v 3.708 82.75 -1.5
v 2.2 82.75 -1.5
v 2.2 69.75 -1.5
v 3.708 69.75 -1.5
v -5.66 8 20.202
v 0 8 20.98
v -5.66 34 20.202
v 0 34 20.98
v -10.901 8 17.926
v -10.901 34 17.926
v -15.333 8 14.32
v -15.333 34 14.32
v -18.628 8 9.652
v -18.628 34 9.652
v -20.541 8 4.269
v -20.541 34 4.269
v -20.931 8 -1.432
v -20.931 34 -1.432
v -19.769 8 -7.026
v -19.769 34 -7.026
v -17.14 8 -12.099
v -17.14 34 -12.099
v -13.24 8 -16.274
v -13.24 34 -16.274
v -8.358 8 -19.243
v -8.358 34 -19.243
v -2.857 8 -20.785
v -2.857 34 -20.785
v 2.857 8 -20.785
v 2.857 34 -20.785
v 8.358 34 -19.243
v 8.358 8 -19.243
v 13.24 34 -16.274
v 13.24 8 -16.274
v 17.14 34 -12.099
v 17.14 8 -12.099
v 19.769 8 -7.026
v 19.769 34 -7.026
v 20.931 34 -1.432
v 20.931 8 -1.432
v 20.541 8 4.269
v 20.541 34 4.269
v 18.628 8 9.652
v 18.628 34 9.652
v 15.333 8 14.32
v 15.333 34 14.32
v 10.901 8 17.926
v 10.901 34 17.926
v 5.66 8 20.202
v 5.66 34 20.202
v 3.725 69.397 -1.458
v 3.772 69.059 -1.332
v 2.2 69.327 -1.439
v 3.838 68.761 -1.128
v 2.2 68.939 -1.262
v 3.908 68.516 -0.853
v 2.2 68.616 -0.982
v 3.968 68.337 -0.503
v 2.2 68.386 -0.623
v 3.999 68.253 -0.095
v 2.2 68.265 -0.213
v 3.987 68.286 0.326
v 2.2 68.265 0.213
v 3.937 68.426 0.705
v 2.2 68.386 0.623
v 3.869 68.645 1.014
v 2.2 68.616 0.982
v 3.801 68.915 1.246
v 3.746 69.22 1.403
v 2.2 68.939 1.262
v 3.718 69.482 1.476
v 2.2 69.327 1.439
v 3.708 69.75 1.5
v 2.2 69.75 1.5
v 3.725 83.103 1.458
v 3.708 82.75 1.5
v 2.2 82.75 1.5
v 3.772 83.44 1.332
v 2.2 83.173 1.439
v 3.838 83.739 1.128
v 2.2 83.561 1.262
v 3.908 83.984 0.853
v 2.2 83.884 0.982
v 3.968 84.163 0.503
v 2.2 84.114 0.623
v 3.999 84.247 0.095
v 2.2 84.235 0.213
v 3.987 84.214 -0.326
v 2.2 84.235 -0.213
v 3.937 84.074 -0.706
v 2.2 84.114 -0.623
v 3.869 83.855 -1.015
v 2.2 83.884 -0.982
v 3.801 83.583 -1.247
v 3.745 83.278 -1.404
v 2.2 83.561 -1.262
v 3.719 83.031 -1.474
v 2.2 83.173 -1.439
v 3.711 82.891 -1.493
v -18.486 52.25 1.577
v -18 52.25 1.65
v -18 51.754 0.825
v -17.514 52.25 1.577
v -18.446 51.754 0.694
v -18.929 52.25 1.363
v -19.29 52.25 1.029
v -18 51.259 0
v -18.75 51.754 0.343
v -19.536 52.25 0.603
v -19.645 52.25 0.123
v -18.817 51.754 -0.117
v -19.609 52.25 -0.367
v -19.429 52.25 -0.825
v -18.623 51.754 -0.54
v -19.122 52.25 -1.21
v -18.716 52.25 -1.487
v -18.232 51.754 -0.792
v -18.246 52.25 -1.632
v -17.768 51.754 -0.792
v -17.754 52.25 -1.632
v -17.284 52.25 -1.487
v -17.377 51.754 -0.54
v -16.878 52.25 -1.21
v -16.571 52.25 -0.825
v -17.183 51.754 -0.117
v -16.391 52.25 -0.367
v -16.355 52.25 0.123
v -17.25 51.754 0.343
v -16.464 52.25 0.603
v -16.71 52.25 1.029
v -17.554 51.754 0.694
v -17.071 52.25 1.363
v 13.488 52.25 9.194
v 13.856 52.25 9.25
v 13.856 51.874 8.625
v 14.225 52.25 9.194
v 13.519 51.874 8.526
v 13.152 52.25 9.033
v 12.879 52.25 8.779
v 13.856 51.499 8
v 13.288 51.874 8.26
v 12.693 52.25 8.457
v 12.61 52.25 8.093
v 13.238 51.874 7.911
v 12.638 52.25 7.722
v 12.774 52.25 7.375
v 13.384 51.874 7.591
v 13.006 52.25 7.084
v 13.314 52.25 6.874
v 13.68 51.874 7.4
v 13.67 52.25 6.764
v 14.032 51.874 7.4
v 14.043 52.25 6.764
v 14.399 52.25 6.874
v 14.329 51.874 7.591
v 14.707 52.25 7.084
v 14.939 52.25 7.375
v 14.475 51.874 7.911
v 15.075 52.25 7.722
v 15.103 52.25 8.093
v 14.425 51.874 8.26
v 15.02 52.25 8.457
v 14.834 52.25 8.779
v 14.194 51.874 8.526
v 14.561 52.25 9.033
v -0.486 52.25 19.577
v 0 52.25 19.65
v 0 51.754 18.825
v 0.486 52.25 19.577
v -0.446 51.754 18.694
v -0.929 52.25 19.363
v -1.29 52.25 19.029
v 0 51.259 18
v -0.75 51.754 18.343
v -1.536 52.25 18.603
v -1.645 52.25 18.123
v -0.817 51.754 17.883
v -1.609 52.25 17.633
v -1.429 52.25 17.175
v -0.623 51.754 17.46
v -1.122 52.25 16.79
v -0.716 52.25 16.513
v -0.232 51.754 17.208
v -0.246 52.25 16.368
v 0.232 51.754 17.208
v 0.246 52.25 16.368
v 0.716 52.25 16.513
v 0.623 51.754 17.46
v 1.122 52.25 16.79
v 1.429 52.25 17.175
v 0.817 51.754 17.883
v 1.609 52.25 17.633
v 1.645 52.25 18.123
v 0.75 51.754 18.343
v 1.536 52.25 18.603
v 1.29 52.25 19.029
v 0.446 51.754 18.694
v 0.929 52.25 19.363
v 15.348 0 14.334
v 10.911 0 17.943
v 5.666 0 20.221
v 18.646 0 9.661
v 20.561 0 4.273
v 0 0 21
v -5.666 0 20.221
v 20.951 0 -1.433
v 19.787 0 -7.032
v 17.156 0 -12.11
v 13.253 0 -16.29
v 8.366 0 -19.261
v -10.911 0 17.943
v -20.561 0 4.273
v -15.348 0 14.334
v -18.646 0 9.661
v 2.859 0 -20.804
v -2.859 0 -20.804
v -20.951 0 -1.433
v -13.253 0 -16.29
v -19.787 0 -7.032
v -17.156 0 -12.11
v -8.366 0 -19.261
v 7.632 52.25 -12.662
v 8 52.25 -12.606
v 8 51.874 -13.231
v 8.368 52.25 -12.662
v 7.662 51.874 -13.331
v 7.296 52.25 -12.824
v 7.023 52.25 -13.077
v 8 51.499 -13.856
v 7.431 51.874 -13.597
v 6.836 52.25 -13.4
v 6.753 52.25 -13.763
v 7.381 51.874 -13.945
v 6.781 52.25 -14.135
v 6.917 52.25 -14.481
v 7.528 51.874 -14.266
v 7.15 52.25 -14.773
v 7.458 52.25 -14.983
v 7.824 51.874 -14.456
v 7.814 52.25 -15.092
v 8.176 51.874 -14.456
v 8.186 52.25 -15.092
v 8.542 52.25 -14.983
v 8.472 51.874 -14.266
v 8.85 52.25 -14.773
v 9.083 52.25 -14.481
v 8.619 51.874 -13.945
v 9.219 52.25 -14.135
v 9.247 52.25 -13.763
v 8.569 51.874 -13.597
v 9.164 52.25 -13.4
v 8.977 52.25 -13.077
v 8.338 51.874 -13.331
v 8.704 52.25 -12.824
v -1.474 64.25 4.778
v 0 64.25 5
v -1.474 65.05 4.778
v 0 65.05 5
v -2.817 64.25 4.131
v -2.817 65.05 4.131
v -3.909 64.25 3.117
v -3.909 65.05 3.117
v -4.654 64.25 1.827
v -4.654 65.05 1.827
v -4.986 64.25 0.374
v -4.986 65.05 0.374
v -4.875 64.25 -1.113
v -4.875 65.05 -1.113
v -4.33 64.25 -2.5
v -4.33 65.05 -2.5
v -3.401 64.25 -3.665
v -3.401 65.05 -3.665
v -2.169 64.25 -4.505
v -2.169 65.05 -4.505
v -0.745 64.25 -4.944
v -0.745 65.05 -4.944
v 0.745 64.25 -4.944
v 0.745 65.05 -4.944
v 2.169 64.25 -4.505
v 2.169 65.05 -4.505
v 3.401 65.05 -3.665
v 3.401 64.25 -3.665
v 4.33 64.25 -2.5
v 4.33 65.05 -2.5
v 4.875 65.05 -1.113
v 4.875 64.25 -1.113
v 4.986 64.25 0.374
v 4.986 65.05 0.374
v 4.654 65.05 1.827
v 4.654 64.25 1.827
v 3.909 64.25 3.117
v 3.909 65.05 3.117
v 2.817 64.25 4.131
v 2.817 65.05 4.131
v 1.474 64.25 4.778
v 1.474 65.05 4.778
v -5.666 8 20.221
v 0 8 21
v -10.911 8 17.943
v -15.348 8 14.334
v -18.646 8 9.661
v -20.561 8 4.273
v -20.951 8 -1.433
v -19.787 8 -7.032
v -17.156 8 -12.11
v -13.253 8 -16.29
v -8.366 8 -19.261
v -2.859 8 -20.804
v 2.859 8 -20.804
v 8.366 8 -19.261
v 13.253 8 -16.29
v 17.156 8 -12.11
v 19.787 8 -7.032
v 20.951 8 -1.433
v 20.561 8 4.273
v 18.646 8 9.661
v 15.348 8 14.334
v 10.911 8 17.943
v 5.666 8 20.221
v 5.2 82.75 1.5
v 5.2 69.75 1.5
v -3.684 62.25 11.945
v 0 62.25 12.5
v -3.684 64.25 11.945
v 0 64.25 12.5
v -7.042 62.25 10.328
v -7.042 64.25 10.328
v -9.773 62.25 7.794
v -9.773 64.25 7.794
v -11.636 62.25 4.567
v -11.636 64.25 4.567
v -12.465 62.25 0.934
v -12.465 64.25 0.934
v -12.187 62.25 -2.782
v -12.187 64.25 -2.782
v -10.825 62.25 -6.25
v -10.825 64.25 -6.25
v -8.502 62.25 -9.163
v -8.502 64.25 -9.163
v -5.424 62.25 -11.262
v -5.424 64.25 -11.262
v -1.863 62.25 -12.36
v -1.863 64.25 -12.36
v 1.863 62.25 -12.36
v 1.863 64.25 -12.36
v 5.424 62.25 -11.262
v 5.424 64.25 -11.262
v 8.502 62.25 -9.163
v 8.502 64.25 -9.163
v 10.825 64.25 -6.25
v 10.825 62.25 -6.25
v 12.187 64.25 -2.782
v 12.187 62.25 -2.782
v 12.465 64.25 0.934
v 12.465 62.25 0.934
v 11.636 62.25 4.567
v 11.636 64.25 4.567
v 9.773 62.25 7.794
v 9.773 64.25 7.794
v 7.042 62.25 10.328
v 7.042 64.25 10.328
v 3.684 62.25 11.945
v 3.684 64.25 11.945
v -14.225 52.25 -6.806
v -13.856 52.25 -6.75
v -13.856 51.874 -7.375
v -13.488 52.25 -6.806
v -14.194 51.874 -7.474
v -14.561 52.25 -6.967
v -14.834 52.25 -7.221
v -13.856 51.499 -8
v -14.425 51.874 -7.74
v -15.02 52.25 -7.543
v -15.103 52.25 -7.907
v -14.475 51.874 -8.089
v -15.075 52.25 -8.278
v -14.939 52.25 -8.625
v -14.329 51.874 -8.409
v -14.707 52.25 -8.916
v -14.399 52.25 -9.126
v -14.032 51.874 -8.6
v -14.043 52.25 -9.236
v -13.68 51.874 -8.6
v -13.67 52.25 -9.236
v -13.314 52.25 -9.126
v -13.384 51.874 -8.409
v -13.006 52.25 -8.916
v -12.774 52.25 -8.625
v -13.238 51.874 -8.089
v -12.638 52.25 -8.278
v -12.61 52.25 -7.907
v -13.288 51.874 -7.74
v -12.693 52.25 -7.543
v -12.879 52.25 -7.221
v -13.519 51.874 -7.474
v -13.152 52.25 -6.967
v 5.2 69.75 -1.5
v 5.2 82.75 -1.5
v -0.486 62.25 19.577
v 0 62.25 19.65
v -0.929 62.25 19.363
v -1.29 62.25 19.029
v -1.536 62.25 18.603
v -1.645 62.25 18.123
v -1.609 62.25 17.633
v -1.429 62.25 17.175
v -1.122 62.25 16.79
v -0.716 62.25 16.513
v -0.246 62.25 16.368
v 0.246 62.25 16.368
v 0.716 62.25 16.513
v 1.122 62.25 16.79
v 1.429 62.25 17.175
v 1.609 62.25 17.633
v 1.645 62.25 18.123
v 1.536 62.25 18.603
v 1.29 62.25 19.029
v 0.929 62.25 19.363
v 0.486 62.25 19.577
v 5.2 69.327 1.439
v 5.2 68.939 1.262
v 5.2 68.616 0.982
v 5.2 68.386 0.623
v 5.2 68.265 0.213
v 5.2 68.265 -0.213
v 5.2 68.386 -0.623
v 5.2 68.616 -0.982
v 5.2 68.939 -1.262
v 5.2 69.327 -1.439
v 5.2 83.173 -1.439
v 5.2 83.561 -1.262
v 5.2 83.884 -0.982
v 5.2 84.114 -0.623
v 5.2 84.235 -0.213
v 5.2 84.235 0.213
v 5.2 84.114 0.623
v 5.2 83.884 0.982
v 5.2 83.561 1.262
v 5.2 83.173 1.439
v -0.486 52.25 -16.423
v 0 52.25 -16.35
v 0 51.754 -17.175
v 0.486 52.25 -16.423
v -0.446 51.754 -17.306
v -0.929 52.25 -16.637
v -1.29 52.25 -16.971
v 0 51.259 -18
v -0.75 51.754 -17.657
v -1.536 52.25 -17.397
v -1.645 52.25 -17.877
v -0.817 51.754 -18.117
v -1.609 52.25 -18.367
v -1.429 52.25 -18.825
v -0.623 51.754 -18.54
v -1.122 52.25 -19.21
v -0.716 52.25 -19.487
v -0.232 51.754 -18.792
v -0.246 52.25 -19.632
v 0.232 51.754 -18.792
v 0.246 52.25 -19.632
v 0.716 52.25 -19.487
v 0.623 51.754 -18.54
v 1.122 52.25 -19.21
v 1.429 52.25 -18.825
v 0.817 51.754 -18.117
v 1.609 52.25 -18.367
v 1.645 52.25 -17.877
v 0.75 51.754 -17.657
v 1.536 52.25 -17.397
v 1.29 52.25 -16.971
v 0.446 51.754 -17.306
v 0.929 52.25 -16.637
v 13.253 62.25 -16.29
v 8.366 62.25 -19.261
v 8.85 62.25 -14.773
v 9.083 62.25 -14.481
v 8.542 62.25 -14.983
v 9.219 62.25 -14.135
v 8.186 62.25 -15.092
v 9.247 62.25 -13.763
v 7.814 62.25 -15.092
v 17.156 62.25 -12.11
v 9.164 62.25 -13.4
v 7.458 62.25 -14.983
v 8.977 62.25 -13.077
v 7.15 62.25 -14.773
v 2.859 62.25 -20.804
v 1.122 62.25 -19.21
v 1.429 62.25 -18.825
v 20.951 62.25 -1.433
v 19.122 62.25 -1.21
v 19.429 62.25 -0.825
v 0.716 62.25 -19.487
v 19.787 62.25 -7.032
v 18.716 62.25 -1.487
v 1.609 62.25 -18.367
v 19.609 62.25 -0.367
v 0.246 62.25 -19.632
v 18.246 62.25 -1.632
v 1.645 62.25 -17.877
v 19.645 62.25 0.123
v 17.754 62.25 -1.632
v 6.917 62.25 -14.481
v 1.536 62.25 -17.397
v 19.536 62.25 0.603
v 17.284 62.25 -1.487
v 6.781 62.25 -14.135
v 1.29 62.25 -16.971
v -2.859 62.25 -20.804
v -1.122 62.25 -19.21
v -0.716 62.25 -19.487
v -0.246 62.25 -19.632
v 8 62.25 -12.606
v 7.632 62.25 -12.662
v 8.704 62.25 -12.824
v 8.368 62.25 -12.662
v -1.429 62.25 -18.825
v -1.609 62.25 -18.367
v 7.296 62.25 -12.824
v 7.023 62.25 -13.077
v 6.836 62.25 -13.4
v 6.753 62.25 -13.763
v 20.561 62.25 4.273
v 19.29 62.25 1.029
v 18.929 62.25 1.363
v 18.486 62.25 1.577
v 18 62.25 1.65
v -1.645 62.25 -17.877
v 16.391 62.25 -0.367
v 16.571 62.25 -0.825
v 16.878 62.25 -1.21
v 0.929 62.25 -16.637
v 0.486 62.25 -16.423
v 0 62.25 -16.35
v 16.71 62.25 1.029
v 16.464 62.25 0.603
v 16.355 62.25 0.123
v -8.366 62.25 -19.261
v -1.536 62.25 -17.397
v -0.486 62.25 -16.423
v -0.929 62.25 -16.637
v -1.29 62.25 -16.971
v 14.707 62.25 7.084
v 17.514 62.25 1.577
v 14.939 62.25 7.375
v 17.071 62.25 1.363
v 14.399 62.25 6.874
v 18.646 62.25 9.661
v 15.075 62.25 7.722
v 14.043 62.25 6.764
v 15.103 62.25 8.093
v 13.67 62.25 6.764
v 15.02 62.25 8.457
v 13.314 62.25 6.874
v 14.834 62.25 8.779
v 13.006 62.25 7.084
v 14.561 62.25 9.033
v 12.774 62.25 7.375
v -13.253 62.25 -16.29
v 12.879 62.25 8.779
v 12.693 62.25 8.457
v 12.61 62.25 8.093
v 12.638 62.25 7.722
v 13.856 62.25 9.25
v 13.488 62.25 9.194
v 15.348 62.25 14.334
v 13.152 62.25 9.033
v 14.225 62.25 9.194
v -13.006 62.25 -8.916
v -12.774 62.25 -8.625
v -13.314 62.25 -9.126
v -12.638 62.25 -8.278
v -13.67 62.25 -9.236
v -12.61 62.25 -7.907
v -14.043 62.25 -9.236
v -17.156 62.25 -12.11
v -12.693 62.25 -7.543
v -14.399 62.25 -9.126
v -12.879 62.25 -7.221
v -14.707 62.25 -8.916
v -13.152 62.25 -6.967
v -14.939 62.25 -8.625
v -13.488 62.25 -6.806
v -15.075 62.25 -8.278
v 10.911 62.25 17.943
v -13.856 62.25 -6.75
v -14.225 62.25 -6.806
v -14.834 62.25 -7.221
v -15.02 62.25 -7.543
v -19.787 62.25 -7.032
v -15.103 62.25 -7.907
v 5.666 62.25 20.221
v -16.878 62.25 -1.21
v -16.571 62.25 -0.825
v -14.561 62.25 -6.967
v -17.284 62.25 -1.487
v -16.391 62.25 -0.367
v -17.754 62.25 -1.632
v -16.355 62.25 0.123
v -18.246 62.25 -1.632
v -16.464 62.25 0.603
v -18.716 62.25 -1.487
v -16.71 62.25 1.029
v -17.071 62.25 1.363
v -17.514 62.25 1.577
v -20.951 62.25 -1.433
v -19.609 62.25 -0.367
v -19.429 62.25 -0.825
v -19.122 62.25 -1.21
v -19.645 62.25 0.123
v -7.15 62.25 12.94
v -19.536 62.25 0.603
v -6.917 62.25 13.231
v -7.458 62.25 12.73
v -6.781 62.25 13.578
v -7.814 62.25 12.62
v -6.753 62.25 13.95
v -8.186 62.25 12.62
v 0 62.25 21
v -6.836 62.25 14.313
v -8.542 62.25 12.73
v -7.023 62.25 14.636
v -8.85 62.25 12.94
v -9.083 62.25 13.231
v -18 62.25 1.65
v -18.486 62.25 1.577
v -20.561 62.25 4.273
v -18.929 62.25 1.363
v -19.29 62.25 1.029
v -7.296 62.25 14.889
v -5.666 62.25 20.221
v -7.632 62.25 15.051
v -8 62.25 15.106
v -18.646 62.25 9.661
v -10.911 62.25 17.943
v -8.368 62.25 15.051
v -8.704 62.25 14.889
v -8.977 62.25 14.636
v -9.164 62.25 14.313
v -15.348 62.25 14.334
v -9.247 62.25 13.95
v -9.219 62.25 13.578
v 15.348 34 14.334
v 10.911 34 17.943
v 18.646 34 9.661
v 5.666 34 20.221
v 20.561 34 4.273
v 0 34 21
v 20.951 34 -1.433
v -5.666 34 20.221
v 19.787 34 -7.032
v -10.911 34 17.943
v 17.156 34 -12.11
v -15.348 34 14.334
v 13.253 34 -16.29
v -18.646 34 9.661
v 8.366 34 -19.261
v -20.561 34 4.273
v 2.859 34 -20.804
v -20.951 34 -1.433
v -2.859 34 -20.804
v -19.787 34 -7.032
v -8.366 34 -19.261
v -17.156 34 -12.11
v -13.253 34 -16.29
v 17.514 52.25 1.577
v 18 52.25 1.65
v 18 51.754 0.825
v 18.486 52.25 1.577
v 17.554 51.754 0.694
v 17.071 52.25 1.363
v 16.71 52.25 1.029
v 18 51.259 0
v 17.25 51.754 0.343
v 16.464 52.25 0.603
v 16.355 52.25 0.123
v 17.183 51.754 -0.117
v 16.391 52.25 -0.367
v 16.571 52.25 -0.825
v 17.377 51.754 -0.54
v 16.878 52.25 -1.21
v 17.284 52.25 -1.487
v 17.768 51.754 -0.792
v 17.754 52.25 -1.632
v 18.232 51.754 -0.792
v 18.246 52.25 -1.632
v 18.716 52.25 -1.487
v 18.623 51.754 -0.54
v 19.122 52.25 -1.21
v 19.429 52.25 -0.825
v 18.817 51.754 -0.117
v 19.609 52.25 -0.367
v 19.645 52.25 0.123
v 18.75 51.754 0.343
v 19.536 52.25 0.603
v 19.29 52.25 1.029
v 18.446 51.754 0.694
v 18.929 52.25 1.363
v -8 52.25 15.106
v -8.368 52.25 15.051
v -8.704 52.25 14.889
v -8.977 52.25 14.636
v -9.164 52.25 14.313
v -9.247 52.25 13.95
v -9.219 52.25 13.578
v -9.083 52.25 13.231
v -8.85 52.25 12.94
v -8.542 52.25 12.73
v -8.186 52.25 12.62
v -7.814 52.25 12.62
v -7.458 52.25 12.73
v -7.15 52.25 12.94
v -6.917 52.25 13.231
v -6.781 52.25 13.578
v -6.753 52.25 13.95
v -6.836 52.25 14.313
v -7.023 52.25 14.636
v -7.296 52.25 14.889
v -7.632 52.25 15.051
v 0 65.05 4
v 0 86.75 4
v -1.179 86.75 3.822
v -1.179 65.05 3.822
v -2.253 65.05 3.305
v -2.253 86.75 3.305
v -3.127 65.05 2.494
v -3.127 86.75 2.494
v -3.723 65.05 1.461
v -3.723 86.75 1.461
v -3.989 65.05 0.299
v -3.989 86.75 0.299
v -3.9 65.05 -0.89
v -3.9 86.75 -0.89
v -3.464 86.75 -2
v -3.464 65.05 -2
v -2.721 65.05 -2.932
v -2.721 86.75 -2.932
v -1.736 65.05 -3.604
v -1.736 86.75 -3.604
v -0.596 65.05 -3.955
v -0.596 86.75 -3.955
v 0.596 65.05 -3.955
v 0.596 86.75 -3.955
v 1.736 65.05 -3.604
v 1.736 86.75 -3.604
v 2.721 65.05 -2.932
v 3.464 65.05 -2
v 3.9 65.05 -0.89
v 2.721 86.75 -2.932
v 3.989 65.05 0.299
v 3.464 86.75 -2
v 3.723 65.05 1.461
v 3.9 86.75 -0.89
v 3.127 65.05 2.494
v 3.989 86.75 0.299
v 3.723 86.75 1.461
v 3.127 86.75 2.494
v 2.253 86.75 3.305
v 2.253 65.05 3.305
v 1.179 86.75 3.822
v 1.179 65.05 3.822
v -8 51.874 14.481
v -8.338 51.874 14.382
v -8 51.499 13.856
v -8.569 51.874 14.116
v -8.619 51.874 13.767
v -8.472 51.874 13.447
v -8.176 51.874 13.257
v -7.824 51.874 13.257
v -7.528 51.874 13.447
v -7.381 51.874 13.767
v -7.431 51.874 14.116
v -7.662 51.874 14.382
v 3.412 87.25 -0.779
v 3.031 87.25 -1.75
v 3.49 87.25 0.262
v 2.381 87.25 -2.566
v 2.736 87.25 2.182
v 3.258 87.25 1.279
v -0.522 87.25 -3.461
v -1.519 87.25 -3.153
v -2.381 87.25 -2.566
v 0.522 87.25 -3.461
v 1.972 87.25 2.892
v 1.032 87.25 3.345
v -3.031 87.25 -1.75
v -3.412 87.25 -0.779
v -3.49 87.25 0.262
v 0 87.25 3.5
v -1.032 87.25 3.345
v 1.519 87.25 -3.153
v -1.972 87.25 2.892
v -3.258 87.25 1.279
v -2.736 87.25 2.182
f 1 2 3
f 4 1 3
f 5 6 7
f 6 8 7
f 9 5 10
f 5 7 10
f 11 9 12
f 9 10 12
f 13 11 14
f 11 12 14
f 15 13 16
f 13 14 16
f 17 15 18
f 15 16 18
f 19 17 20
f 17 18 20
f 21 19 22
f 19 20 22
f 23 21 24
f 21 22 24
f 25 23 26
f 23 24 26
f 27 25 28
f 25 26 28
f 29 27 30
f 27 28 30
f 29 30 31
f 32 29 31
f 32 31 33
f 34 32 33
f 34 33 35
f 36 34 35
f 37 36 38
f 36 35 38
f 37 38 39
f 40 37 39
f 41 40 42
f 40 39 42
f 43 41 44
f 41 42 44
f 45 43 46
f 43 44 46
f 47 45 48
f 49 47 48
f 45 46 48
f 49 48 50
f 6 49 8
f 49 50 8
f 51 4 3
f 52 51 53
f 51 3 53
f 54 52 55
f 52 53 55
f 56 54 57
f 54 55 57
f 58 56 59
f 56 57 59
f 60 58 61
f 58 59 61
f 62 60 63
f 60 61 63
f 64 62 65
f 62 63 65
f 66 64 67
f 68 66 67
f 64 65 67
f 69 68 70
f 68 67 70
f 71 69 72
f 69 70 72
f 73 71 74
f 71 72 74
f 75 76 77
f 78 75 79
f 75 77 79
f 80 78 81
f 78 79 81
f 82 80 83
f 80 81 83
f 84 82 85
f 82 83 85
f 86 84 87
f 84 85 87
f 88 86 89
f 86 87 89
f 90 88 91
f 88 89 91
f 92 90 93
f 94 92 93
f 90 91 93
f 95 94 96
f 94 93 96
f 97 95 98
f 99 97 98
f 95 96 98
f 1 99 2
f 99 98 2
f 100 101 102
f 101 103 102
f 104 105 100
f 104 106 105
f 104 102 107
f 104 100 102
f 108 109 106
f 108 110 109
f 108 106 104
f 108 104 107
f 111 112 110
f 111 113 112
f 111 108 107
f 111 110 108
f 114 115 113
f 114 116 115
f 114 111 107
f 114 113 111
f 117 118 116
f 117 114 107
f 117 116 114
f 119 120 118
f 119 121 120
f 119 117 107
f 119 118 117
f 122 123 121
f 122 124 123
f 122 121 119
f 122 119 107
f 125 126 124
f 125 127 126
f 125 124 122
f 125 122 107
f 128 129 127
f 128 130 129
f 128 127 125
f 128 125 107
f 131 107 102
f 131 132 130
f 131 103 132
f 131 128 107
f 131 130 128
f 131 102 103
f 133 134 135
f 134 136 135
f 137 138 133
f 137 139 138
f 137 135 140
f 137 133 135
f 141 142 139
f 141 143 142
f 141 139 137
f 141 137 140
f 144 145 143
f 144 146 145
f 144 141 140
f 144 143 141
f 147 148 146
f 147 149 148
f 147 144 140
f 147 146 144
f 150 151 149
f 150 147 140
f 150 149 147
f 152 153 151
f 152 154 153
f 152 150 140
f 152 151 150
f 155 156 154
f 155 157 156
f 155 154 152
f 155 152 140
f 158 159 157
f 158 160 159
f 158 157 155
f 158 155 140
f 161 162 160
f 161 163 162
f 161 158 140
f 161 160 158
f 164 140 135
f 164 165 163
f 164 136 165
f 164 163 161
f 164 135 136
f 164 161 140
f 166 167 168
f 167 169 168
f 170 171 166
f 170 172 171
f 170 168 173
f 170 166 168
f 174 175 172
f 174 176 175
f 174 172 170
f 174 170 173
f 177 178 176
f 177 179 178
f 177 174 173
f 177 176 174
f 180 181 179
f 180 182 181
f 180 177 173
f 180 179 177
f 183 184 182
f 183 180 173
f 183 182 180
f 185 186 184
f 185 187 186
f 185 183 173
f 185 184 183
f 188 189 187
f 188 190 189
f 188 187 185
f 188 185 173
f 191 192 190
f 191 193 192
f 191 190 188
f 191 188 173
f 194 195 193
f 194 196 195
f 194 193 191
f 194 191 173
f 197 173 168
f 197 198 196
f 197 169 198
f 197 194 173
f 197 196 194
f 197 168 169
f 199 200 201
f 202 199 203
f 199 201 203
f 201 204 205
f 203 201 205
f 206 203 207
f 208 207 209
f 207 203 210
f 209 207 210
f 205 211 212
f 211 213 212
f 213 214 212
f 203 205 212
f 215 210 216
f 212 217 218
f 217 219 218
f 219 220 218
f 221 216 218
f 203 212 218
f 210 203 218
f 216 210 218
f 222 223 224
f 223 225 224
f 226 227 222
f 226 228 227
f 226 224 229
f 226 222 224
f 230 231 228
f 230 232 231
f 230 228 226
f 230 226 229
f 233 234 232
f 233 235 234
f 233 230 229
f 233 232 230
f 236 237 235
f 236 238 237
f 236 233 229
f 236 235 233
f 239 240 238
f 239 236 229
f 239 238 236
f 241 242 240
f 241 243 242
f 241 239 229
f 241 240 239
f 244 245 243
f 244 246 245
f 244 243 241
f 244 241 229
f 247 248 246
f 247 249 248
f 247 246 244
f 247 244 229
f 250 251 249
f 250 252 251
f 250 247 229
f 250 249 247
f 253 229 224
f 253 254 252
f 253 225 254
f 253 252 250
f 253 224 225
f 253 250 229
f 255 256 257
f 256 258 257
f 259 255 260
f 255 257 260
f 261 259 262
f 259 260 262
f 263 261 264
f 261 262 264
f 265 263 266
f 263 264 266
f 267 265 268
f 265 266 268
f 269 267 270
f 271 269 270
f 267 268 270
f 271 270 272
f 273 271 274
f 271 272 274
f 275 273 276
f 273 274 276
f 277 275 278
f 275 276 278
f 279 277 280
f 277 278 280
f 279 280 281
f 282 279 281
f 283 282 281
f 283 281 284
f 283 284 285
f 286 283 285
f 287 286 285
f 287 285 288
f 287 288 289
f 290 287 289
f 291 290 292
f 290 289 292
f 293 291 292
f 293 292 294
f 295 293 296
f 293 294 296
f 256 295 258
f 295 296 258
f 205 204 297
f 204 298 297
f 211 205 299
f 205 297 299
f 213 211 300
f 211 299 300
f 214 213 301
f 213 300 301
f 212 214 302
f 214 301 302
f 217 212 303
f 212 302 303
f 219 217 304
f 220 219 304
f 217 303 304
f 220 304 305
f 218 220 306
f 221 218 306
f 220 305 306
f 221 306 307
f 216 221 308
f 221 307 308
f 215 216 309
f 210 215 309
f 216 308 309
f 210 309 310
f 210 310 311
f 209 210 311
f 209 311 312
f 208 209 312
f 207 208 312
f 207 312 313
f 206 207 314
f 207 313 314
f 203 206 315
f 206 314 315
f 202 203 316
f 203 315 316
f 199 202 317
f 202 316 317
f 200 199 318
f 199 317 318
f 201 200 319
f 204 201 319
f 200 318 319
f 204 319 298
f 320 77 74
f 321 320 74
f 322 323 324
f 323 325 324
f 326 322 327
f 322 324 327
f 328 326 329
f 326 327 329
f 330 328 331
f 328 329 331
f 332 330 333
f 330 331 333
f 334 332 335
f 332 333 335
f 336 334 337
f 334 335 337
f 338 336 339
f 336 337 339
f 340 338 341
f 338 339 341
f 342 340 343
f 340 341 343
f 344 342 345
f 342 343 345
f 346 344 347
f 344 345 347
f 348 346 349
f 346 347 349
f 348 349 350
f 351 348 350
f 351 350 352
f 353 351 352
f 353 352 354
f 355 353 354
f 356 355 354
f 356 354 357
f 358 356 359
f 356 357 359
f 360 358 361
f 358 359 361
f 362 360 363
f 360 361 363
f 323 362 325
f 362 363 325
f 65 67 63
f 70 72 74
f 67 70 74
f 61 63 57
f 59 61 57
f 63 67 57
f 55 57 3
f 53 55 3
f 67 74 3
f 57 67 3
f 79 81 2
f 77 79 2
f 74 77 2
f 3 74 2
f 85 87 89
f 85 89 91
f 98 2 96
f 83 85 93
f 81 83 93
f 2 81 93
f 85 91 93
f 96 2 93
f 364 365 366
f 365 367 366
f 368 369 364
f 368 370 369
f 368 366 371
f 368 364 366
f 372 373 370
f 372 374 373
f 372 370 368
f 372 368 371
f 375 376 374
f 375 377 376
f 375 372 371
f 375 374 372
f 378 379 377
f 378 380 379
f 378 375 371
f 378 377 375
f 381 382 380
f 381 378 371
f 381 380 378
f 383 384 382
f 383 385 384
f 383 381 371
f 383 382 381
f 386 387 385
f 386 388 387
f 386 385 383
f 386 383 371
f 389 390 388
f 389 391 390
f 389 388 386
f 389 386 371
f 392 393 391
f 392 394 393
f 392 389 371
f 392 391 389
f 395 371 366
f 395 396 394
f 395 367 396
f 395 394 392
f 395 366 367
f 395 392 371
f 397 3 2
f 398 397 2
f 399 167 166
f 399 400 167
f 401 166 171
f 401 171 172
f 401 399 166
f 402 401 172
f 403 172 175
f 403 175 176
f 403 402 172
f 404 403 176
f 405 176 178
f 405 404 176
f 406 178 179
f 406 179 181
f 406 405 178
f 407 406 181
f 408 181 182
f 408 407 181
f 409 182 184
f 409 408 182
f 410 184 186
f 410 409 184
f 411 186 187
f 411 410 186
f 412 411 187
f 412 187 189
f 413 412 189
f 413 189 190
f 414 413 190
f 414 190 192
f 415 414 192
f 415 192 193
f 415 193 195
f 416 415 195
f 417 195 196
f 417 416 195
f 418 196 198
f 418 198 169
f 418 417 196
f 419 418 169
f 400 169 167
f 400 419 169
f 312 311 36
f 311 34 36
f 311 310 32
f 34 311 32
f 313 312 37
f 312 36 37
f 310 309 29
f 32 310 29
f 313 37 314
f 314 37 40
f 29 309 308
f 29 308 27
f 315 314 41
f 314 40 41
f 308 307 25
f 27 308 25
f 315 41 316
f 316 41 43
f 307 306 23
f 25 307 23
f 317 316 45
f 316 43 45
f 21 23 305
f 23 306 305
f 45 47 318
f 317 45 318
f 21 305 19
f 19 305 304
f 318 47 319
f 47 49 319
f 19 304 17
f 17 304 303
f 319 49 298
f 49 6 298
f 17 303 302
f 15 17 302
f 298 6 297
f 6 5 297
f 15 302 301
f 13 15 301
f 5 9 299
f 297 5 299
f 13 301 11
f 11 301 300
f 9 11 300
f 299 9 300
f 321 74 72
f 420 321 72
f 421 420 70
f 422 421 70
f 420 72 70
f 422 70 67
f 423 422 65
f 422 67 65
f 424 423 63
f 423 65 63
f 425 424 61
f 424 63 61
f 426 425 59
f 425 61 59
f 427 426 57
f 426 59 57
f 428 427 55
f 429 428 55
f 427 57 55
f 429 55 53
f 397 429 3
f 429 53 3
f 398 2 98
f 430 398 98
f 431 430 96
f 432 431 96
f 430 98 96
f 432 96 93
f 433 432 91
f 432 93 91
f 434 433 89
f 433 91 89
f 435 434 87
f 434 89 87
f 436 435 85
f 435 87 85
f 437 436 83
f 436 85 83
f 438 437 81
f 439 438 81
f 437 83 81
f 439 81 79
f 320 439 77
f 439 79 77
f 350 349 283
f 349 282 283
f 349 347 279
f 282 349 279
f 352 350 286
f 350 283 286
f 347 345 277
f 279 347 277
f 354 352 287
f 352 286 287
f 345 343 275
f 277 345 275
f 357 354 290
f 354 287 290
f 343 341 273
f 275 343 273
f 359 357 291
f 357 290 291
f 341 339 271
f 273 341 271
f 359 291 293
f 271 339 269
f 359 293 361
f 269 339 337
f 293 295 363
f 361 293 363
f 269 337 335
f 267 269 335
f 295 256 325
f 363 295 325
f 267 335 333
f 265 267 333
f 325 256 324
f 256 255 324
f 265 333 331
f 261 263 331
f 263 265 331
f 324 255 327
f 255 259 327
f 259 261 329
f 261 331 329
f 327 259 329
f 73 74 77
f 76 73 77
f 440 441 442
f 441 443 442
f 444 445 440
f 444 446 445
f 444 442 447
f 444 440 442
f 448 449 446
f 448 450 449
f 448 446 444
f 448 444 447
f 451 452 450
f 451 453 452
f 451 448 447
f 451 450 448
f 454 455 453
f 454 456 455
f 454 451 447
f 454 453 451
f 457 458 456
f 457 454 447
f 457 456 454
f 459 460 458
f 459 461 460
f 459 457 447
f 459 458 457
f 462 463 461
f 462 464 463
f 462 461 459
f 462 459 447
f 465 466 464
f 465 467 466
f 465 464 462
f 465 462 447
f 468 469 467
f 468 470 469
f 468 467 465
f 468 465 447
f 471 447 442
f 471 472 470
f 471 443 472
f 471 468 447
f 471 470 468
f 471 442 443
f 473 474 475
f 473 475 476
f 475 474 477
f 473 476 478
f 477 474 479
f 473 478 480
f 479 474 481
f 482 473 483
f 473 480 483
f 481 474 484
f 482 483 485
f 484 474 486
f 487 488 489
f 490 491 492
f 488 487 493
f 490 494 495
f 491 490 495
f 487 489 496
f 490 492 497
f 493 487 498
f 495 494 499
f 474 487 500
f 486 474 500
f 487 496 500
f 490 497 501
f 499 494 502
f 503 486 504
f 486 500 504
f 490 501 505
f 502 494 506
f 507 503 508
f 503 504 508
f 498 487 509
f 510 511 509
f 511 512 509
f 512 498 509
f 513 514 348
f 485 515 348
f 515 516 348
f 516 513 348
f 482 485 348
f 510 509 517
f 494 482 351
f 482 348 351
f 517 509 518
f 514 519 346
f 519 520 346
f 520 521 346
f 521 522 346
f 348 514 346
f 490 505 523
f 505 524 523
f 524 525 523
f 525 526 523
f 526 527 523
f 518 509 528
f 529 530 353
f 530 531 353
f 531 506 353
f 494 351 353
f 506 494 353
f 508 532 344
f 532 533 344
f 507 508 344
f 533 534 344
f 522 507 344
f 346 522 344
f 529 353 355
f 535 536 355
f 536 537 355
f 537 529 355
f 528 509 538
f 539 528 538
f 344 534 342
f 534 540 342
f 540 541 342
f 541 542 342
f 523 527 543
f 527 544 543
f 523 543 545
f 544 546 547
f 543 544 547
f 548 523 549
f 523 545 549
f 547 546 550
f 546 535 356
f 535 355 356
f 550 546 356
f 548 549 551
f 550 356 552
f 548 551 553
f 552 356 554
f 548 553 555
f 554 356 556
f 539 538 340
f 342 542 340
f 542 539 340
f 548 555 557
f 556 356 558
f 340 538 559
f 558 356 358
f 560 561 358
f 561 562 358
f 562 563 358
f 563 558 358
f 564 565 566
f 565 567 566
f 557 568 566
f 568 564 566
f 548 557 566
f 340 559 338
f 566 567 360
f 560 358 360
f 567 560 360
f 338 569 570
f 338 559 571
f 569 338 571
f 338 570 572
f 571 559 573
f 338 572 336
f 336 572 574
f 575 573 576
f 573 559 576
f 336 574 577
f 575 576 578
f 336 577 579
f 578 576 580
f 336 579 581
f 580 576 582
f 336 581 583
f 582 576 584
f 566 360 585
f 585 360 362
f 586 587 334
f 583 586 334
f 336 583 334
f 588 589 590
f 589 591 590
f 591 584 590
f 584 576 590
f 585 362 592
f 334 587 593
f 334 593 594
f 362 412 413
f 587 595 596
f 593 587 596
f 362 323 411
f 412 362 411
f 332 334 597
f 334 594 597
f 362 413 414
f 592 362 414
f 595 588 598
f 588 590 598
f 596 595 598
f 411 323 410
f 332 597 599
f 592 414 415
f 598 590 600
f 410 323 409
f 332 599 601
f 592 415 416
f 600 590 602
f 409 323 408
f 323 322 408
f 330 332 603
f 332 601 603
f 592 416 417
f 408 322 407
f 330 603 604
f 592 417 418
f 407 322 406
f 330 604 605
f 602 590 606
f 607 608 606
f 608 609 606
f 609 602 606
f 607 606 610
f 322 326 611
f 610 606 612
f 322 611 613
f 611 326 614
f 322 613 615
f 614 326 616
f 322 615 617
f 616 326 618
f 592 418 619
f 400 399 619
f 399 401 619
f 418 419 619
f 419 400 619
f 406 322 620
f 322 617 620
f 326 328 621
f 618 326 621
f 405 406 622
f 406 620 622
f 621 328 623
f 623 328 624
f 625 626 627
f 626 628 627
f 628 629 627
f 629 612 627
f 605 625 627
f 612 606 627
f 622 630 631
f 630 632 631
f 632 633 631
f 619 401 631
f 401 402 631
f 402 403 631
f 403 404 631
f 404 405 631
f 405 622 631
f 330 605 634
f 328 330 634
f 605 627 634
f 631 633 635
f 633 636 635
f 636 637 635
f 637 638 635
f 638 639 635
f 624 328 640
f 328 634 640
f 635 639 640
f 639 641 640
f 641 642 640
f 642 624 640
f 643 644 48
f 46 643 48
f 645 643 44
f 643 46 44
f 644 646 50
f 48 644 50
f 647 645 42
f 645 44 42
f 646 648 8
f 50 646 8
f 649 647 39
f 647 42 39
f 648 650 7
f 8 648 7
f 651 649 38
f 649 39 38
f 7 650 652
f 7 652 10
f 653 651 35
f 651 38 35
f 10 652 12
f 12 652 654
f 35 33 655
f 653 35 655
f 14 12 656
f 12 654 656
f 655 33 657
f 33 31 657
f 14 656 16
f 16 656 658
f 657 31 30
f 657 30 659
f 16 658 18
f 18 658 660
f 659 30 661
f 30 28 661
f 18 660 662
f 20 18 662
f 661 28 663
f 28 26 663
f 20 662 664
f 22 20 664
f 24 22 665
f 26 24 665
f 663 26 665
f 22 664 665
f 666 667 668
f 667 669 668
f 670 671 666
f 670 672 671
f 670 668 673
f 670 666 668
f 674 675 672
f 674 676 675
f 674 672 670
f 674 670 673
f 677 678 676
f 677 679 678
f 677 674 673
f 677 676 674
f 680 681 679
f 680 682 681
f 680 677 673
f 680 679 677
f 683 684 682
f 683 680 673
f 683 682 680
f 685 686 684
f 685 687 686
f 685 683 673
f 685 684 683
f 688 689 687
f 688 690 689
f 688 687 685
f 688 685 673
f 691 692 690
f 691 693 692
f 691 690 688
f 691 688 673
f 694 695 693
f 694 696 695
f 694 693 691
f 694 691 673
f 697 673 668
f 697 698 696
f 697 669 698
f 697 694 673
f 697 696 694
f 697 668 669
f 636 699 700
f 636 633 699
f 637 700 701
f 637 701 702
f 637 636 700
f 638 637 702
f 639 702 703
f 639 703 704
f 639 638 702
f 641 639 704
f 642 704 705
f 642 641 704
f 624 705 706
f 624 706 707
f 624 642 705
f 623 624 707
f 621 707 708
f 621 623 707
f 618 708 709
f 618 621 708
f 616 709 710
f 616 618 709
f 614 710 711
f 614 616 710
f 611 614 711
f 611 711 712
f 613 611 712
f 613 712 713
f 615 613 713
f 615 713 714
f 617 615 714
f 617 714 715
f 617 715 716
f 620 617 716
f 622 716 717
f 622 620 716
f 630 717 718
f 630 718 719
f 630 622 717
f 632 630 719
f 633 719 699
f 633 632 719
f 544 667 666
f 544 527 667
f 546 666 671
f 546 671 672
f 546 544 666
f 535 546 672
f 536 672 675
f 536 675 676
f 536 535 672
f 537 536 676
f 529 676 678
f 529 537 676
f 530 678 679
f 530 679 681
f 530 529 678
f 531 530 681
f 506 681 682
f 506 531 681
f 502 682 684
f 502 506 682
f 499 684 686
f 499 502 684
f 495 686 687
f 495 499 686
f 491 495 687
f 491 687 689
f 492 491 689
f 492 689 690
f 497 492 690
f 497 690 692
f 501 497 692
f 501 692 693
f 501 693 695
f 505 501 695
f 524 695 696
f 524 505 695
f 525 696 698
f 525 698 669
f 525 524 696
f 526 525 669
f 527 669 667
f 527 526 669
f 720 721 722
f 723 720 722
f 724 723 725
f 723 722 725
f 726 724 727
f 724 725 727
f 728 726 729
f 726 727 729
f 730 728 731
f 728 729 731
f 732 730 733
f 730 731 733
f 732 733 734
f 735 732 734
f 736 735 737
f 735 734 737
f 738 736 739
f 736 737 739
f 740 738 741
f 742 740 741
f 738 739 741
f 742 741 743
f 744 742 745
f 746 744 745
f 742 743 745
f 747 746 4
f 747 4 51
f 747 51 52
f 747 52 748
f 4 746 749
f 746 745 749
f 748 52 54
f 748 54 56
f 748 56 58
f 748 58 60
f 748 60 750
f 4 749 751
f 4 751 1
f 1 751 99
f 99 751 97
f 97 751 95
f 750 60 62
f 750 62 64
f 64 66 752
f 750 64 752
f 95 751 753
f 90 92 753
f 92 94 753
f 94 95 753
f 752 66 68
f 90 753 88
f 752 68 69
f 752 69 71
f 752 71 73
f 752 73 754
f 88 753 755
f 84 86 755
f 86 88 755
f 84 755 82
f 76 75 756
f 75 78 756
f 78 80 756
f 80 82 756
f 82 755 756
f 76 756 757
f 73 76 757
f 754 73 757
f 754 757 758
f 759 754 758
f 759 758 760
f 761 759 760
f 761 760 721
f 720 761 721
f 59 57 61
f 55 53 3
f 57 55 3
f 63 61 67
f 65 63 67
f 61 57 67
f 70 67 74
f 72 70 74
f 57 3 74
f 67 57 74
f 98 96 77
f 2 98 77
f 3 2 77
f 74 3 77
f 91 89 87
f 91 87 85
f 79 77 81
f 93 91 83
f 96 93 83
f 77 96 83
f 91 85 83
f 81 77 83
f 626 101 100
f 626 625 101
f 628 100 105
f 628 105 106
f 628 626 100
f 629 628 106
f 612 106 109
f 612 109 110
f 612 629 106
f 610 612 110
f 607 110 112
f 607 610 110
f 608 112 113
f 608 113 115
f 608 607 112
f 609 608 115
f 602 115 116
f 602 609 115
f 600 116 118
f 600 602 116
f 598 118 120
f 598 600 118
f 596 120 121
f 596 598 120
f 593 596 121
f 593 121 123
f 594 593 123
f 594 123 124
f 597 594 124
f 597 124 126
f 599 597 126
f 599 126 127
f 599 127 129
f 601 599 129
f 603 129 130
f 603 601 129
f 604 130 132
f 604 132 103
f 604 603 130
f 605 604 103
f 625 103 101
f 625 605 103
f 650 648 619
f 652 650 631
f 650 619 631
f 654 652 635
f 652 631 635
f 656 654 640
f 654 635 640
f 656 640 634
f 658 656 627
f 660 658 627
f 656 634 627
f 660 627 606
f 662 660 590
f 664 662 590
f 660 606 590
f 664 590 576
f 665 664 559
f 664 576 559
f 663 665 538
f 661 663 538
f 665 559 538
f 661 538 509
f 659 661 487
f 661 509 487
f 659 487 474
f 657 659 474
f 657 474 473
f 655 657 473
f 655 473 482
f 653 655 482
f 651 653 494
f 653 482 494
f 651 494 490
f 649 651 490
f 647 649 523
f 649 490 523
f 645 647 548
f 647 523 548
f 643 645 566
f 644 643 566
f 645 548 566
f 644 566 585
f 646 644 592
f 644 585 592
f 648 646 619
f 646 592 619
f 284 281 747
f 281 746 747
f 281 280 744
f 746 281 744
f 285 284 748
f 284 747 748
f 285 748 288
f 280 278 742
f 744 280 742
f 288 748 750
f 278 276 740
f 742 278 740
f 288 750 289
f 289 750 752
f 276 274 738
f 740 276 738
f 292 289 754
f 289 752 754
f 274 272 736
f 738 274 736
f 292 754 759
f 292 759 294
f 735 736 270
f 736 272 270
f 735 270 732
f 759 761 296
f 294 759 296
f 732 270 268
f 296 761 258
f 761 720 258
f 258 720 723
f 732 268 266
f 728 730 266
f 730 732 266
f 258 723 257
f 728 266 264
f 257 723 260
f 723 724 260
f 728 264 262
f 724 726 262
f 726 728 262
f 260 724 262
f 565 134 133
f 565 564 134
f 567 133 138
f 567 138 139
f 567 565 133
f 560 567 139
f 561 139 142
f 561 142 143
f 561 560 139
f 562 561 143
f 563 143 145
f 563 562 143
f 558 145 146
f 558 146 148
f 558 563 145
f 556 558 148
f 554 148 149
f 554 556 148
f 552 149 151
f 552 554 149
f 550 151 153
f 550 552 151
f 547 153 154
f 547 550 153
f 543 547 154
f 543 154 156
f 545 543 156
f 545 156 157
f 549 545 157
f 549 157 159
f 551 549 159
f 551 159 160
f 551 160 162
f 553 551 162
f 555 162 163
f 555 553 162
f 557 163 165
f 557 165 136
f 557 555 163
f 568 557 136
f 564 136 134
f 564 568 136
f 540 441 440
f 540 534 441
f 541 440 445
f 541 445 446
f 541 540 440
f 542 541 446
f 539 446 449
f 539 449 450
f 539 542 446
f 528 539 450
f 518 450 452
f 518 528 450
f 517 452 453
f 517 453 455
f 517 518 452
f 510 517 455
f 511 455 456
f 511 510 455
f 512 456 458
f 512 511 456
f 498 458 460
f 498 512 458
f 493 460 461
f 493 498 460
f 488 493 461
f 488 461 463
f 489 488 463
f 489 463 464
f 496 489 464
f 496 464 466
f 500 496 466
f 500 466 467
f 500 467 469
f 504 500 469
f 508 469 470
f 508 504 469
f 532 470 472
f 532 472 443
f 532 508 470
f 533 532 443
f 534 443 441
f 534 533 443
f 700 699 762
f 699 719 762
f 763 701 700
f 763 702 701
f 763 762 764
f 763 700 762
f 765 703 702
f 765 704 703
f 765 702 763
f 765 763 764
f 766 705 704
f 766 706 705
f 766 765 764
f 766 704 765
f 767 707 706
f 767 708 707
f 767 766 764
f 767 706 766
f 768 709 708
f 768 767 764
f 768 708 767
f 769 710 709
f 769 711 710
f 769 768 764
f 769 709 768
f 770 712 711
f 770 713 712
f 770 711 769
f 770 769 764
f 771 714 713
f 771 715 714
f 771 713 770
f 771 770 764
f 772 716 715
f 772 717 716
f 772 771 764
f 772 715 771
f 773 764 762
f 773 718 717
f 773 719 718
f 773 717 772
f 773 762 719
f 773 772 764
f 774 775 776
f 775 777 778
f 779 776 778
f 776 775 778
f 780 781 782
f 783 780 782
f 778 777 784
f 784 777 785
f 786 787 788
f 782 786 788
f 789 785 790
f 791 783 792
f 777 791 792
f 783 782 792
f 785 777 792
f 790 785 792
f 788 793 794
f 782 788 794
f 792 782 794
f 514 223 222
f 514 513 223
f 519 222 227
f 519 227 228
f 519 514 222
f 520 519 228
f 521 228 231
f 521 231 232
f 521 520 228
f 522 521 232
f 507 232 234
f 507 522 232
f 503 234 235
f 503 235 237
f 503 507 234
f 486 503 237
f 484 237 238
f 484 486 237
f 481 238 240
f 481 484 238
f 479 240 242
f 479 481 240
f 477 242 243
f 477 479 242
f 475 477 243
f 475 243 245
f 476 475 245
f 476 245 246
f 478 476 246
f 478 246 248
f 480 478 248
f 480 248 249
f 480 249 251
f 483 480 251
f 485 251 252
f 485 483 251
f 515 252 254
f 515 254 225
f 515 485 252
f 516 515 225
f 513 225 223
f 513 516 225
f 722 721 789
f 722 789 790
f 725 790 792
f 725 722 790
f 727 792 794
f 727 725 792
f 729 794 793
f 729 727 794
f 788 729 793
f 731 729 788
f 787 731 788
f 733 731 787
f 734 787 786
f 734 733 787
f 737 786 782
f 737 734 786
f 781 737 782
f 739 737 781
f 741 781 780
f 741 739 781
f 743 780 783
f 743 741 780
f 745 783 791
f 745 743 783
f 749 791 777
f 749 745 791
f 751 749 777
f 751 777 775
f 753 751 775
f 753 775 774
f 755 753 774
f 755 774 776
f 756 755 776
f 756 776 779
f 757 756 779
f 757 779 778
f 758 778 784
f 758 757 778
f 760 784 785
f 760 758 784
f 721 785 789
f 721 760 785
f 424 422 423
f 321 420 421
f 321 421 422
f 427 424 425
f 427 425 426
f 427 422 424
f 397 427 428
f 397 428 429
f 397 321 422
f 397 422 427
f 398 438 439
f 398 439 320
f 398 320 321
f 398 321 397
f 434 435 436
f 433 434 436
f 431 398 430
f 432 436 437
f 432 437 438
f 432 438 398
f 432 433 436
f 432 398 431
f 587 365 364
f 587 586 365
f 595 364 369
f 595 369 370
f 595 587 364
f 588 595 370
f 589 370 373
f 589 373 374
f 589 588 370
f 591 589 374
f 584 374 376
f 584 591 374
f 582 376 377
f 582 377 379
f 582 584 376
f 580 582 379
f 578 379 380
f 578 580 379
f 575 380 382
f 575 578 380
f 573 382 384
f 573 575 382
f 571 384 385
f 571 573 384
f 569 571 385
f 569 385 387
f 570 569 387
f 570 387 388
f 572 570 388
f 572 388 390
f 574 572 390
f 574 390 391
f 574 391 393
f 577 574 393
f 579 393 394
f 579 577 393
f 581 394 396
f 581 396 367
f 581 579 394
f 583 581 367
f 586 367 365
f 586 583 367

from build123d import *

# Parameters (mm, degrees)
CUT_EXTRUDE_START           = 2.2
CUT_EXTRUDE_1_DEPTH         = 90.965950871
CHAMFER_1_SIZE              = 0.5
EXTRUDE_1_DEPTH             = 3
HOLE_WIZARD_M3_1_AT_2_COUNT = 2
HOLE_WIZARD_M3_1_AT_2_PITCH = 22.627416998
HOLE_WIZARD_M3_1_AT_3_COUNT = 2
HOLE_WIZARD_M3_1_AT_3_PITCH = 22.627416998
HOLE_WIZARD_M3_1_AT_4_COUNT = 2
HOLE_WIZARD_M3_1_AT_4_PITCH = 32
HOLE_WIZARD_M4_1_AT_2_COUNT = 2
HOLE_WIZARD_M4_1_AT_2_PITCH = 25.455844123
HOLE_WIZARD_M4_1_AT_3_COUNT = 2
HOLE_WIZARD_M4_1_AT_3_PITCH = 36
HOLE_WIZARD_M4_1_AT_4_COUNT = 2
HOLE_WIZARD_M4_1_AT_4_PITCH = 25.455844123


with BuildPart() as part:
    # 草图1 → 旋转1 (revolve)
    with BuildSketch(Plane.XY, mode=Mode.PRIVATE) as revolve_1_sk:
        Polygon((4, 87.25), (0, 87.25), (0, 0), (21, 0), (21, 8), (20.98, 8), (20.98, 34), (21, 34), (21, 62.25), (12.5, 62.25), (12.5, 64.25), (5, 64.25), (5, 65.05), (4, 65.05), align=None)
    revolve(revolve_1_sk.sketch.rotate(Axis((0, 99.847112311, 0), (0, -1, 0)), 90), axis=Axis((0, 99.847112311, 0), (0, -1, 0)))

    # 草图2 → 切除-拉伸1 (cut, through all)
    with BuildSketch(Plane(origin=(0, 0, 0), x_dir=(0, 0, -1), z_dir=(1, 0, 0)).offset(CUT_EXTRUDE_START)):
        with BuildLine():
            Line((-1.5, 69.75), (-1.5, 82.75))
            ThreePointArc((-1.5, 82.75), (0, 84.25), (1.5, 82.75))
            Line((1.5, 82.75), (1.5, 69.75))
            ThreePointArc((1.5, 69.75), (0, 68.25), (-1.5, 69.75))
        make_face()
    extrude(amount=CUT_EXTRUDE_1_DEPTH, mode=Mode.SUBTRACT)

    # 倒角1
    chamfer_1_edges = [part.edges().sort_by_distance(p)[0] for p in [
        (0, 87.25, -4),
    ]]
    chamfer(chamfer_1_edges, length=CHAMFER_1_SIZE)

    # 草图6 → M3 螺纹孔1 (revolve, cut)
    with BuildSketch(Plane(origin=(13.856406461, 62.25, 8), x_dir=(0, 0, 1), z_dir=(1, 0, 0))):
        Polygon((0, 0), (0, 10.751075774), (1.25, 10), (1.25, 0), align=None)
    hole_wizard_m3_1 = revolve(axis=Axis((13.856406461, 68.6, 8), (0, -1, 0)), mode=Mode.SUBTRACT)

    # M3 螺纹孔1 at 2: M3 螺纹孔1 ×2
    with Locations(*[Vector(-0.25881904510252673, 0, -0.9659258262890666) * (i * HOLE_WIZARD_M3_1_AT_2_PITCH) for i in range(1, HOLE_WIZARD_M3_1_AT_2_COUNT)]):
        add(hole_wizard_m3_1, mode=Mode.SUBTRACT)

    # M3 螺纹孔1 at 3: M3 螺纹孔1 ×2
    with Locations(*[Vector(-0.9659258262890666, 0, 0.25881904510252673) * (i * HOLE_WIZARD_M3_1_AT_3_PITCH) for i in range(1, HOLE_WIZARD_M3_1_AT_3_COUNT)]):
        add(hole_wizard_m3_1, mode=Mode.SUBTRACT)

    # M3 螺纹孔1 at 4: M3 螺纹孔1 ×2
    with Locations(*[Vector(-0.8660254037844418, 0, -0.4999999999999946) * (i * HOLE_WIZARD_M3_1_AT_4_PITCH) for i in range(1, HOLE_WIZARD_M3_1_AT_4_COUNT)]):
        add(hole_wizard_m3_1, mode=Mode.SUBTRACT)

    # 草图8 → M4 螺纹孔1 (revolve, cut)
    with BuildSketch(Plane(origin=(18, 62.25, 0), x_dir=(0, 0, 1), z_dir=(1, 0, 0))):
        Polygon((0, 0), (0, 10.991420021), (1.65, 10), (1.65, 0), align=None)
    hole_wizard_m4_1 = revolve(axis=Axis((18, 68.6, 0), (0, -1, 0)), mode=Mode.SUBTRACT)

    # M4 螺纹孔1 at 2: M4 螺纹孔1 ×2
    with Locations(*[Vector(-0.7071067811865476, 0, 0.7071067811865476) * (i * HOLE_WIZARD_M4_1_AT_2_PITCH) for i in range(1, HOLE_WIZARD_M4_1_AT_2_COUNT)]):
        add(hole_wizard_m4_1, mode=Mode.SUBTRACT)

    # M4 螺纹孔1 at 3: M4 螺纹孔1 ×2
    with Locations(*[(-i * HOLE_WIZARD_M4_1_AT_3_PITCH, 0, 0) for i in range(1, HOLE_WIZARD_M4_1_AT_3_COUNT)]):
        add(hole_wizard_m4_1, mode=Mode.SUBTRACT)

    # M4 螺纹孔1 at 4: M4 螺纹孔1 ×2
    with Locations(*[Vector(-0.7071067811865476, 0, -0.7071067811865476) * (i * HOLE_WIZARD_M4_1_AT_4_PITCH) for i in range(1, HOLE_WIZARD_M4_1_AT_4_COUNT)]):
        add(hole_wizard_m4_1, mode=Mode.SUBTRACT)


with BuildPart() as body_2:
    # 草图3 → 凸台-拉伸1 (new body)
    with BuildSketch(Plane(origin=(2.2, 0, 0), x_dir=(0, 0, -1), z_dir=(1, 0, 0))):
        with BuildLine():
            Line((1.5, 69.75), (1.5, 82.75))
            ThreePointArc((1.5, 82.75), (0, 84.25), (-1.5, 82.75))
            Line((-1.5, 82.75), (-1.5, 69.75))
            ThreePointArc((-1.5, 69.75), (0, 68.25), (1.5, 69.75))
        make_face()
    extrude(amount=EXTRUDE_1_DEPTH)


solid = Compound([part.part, body_2.part])
